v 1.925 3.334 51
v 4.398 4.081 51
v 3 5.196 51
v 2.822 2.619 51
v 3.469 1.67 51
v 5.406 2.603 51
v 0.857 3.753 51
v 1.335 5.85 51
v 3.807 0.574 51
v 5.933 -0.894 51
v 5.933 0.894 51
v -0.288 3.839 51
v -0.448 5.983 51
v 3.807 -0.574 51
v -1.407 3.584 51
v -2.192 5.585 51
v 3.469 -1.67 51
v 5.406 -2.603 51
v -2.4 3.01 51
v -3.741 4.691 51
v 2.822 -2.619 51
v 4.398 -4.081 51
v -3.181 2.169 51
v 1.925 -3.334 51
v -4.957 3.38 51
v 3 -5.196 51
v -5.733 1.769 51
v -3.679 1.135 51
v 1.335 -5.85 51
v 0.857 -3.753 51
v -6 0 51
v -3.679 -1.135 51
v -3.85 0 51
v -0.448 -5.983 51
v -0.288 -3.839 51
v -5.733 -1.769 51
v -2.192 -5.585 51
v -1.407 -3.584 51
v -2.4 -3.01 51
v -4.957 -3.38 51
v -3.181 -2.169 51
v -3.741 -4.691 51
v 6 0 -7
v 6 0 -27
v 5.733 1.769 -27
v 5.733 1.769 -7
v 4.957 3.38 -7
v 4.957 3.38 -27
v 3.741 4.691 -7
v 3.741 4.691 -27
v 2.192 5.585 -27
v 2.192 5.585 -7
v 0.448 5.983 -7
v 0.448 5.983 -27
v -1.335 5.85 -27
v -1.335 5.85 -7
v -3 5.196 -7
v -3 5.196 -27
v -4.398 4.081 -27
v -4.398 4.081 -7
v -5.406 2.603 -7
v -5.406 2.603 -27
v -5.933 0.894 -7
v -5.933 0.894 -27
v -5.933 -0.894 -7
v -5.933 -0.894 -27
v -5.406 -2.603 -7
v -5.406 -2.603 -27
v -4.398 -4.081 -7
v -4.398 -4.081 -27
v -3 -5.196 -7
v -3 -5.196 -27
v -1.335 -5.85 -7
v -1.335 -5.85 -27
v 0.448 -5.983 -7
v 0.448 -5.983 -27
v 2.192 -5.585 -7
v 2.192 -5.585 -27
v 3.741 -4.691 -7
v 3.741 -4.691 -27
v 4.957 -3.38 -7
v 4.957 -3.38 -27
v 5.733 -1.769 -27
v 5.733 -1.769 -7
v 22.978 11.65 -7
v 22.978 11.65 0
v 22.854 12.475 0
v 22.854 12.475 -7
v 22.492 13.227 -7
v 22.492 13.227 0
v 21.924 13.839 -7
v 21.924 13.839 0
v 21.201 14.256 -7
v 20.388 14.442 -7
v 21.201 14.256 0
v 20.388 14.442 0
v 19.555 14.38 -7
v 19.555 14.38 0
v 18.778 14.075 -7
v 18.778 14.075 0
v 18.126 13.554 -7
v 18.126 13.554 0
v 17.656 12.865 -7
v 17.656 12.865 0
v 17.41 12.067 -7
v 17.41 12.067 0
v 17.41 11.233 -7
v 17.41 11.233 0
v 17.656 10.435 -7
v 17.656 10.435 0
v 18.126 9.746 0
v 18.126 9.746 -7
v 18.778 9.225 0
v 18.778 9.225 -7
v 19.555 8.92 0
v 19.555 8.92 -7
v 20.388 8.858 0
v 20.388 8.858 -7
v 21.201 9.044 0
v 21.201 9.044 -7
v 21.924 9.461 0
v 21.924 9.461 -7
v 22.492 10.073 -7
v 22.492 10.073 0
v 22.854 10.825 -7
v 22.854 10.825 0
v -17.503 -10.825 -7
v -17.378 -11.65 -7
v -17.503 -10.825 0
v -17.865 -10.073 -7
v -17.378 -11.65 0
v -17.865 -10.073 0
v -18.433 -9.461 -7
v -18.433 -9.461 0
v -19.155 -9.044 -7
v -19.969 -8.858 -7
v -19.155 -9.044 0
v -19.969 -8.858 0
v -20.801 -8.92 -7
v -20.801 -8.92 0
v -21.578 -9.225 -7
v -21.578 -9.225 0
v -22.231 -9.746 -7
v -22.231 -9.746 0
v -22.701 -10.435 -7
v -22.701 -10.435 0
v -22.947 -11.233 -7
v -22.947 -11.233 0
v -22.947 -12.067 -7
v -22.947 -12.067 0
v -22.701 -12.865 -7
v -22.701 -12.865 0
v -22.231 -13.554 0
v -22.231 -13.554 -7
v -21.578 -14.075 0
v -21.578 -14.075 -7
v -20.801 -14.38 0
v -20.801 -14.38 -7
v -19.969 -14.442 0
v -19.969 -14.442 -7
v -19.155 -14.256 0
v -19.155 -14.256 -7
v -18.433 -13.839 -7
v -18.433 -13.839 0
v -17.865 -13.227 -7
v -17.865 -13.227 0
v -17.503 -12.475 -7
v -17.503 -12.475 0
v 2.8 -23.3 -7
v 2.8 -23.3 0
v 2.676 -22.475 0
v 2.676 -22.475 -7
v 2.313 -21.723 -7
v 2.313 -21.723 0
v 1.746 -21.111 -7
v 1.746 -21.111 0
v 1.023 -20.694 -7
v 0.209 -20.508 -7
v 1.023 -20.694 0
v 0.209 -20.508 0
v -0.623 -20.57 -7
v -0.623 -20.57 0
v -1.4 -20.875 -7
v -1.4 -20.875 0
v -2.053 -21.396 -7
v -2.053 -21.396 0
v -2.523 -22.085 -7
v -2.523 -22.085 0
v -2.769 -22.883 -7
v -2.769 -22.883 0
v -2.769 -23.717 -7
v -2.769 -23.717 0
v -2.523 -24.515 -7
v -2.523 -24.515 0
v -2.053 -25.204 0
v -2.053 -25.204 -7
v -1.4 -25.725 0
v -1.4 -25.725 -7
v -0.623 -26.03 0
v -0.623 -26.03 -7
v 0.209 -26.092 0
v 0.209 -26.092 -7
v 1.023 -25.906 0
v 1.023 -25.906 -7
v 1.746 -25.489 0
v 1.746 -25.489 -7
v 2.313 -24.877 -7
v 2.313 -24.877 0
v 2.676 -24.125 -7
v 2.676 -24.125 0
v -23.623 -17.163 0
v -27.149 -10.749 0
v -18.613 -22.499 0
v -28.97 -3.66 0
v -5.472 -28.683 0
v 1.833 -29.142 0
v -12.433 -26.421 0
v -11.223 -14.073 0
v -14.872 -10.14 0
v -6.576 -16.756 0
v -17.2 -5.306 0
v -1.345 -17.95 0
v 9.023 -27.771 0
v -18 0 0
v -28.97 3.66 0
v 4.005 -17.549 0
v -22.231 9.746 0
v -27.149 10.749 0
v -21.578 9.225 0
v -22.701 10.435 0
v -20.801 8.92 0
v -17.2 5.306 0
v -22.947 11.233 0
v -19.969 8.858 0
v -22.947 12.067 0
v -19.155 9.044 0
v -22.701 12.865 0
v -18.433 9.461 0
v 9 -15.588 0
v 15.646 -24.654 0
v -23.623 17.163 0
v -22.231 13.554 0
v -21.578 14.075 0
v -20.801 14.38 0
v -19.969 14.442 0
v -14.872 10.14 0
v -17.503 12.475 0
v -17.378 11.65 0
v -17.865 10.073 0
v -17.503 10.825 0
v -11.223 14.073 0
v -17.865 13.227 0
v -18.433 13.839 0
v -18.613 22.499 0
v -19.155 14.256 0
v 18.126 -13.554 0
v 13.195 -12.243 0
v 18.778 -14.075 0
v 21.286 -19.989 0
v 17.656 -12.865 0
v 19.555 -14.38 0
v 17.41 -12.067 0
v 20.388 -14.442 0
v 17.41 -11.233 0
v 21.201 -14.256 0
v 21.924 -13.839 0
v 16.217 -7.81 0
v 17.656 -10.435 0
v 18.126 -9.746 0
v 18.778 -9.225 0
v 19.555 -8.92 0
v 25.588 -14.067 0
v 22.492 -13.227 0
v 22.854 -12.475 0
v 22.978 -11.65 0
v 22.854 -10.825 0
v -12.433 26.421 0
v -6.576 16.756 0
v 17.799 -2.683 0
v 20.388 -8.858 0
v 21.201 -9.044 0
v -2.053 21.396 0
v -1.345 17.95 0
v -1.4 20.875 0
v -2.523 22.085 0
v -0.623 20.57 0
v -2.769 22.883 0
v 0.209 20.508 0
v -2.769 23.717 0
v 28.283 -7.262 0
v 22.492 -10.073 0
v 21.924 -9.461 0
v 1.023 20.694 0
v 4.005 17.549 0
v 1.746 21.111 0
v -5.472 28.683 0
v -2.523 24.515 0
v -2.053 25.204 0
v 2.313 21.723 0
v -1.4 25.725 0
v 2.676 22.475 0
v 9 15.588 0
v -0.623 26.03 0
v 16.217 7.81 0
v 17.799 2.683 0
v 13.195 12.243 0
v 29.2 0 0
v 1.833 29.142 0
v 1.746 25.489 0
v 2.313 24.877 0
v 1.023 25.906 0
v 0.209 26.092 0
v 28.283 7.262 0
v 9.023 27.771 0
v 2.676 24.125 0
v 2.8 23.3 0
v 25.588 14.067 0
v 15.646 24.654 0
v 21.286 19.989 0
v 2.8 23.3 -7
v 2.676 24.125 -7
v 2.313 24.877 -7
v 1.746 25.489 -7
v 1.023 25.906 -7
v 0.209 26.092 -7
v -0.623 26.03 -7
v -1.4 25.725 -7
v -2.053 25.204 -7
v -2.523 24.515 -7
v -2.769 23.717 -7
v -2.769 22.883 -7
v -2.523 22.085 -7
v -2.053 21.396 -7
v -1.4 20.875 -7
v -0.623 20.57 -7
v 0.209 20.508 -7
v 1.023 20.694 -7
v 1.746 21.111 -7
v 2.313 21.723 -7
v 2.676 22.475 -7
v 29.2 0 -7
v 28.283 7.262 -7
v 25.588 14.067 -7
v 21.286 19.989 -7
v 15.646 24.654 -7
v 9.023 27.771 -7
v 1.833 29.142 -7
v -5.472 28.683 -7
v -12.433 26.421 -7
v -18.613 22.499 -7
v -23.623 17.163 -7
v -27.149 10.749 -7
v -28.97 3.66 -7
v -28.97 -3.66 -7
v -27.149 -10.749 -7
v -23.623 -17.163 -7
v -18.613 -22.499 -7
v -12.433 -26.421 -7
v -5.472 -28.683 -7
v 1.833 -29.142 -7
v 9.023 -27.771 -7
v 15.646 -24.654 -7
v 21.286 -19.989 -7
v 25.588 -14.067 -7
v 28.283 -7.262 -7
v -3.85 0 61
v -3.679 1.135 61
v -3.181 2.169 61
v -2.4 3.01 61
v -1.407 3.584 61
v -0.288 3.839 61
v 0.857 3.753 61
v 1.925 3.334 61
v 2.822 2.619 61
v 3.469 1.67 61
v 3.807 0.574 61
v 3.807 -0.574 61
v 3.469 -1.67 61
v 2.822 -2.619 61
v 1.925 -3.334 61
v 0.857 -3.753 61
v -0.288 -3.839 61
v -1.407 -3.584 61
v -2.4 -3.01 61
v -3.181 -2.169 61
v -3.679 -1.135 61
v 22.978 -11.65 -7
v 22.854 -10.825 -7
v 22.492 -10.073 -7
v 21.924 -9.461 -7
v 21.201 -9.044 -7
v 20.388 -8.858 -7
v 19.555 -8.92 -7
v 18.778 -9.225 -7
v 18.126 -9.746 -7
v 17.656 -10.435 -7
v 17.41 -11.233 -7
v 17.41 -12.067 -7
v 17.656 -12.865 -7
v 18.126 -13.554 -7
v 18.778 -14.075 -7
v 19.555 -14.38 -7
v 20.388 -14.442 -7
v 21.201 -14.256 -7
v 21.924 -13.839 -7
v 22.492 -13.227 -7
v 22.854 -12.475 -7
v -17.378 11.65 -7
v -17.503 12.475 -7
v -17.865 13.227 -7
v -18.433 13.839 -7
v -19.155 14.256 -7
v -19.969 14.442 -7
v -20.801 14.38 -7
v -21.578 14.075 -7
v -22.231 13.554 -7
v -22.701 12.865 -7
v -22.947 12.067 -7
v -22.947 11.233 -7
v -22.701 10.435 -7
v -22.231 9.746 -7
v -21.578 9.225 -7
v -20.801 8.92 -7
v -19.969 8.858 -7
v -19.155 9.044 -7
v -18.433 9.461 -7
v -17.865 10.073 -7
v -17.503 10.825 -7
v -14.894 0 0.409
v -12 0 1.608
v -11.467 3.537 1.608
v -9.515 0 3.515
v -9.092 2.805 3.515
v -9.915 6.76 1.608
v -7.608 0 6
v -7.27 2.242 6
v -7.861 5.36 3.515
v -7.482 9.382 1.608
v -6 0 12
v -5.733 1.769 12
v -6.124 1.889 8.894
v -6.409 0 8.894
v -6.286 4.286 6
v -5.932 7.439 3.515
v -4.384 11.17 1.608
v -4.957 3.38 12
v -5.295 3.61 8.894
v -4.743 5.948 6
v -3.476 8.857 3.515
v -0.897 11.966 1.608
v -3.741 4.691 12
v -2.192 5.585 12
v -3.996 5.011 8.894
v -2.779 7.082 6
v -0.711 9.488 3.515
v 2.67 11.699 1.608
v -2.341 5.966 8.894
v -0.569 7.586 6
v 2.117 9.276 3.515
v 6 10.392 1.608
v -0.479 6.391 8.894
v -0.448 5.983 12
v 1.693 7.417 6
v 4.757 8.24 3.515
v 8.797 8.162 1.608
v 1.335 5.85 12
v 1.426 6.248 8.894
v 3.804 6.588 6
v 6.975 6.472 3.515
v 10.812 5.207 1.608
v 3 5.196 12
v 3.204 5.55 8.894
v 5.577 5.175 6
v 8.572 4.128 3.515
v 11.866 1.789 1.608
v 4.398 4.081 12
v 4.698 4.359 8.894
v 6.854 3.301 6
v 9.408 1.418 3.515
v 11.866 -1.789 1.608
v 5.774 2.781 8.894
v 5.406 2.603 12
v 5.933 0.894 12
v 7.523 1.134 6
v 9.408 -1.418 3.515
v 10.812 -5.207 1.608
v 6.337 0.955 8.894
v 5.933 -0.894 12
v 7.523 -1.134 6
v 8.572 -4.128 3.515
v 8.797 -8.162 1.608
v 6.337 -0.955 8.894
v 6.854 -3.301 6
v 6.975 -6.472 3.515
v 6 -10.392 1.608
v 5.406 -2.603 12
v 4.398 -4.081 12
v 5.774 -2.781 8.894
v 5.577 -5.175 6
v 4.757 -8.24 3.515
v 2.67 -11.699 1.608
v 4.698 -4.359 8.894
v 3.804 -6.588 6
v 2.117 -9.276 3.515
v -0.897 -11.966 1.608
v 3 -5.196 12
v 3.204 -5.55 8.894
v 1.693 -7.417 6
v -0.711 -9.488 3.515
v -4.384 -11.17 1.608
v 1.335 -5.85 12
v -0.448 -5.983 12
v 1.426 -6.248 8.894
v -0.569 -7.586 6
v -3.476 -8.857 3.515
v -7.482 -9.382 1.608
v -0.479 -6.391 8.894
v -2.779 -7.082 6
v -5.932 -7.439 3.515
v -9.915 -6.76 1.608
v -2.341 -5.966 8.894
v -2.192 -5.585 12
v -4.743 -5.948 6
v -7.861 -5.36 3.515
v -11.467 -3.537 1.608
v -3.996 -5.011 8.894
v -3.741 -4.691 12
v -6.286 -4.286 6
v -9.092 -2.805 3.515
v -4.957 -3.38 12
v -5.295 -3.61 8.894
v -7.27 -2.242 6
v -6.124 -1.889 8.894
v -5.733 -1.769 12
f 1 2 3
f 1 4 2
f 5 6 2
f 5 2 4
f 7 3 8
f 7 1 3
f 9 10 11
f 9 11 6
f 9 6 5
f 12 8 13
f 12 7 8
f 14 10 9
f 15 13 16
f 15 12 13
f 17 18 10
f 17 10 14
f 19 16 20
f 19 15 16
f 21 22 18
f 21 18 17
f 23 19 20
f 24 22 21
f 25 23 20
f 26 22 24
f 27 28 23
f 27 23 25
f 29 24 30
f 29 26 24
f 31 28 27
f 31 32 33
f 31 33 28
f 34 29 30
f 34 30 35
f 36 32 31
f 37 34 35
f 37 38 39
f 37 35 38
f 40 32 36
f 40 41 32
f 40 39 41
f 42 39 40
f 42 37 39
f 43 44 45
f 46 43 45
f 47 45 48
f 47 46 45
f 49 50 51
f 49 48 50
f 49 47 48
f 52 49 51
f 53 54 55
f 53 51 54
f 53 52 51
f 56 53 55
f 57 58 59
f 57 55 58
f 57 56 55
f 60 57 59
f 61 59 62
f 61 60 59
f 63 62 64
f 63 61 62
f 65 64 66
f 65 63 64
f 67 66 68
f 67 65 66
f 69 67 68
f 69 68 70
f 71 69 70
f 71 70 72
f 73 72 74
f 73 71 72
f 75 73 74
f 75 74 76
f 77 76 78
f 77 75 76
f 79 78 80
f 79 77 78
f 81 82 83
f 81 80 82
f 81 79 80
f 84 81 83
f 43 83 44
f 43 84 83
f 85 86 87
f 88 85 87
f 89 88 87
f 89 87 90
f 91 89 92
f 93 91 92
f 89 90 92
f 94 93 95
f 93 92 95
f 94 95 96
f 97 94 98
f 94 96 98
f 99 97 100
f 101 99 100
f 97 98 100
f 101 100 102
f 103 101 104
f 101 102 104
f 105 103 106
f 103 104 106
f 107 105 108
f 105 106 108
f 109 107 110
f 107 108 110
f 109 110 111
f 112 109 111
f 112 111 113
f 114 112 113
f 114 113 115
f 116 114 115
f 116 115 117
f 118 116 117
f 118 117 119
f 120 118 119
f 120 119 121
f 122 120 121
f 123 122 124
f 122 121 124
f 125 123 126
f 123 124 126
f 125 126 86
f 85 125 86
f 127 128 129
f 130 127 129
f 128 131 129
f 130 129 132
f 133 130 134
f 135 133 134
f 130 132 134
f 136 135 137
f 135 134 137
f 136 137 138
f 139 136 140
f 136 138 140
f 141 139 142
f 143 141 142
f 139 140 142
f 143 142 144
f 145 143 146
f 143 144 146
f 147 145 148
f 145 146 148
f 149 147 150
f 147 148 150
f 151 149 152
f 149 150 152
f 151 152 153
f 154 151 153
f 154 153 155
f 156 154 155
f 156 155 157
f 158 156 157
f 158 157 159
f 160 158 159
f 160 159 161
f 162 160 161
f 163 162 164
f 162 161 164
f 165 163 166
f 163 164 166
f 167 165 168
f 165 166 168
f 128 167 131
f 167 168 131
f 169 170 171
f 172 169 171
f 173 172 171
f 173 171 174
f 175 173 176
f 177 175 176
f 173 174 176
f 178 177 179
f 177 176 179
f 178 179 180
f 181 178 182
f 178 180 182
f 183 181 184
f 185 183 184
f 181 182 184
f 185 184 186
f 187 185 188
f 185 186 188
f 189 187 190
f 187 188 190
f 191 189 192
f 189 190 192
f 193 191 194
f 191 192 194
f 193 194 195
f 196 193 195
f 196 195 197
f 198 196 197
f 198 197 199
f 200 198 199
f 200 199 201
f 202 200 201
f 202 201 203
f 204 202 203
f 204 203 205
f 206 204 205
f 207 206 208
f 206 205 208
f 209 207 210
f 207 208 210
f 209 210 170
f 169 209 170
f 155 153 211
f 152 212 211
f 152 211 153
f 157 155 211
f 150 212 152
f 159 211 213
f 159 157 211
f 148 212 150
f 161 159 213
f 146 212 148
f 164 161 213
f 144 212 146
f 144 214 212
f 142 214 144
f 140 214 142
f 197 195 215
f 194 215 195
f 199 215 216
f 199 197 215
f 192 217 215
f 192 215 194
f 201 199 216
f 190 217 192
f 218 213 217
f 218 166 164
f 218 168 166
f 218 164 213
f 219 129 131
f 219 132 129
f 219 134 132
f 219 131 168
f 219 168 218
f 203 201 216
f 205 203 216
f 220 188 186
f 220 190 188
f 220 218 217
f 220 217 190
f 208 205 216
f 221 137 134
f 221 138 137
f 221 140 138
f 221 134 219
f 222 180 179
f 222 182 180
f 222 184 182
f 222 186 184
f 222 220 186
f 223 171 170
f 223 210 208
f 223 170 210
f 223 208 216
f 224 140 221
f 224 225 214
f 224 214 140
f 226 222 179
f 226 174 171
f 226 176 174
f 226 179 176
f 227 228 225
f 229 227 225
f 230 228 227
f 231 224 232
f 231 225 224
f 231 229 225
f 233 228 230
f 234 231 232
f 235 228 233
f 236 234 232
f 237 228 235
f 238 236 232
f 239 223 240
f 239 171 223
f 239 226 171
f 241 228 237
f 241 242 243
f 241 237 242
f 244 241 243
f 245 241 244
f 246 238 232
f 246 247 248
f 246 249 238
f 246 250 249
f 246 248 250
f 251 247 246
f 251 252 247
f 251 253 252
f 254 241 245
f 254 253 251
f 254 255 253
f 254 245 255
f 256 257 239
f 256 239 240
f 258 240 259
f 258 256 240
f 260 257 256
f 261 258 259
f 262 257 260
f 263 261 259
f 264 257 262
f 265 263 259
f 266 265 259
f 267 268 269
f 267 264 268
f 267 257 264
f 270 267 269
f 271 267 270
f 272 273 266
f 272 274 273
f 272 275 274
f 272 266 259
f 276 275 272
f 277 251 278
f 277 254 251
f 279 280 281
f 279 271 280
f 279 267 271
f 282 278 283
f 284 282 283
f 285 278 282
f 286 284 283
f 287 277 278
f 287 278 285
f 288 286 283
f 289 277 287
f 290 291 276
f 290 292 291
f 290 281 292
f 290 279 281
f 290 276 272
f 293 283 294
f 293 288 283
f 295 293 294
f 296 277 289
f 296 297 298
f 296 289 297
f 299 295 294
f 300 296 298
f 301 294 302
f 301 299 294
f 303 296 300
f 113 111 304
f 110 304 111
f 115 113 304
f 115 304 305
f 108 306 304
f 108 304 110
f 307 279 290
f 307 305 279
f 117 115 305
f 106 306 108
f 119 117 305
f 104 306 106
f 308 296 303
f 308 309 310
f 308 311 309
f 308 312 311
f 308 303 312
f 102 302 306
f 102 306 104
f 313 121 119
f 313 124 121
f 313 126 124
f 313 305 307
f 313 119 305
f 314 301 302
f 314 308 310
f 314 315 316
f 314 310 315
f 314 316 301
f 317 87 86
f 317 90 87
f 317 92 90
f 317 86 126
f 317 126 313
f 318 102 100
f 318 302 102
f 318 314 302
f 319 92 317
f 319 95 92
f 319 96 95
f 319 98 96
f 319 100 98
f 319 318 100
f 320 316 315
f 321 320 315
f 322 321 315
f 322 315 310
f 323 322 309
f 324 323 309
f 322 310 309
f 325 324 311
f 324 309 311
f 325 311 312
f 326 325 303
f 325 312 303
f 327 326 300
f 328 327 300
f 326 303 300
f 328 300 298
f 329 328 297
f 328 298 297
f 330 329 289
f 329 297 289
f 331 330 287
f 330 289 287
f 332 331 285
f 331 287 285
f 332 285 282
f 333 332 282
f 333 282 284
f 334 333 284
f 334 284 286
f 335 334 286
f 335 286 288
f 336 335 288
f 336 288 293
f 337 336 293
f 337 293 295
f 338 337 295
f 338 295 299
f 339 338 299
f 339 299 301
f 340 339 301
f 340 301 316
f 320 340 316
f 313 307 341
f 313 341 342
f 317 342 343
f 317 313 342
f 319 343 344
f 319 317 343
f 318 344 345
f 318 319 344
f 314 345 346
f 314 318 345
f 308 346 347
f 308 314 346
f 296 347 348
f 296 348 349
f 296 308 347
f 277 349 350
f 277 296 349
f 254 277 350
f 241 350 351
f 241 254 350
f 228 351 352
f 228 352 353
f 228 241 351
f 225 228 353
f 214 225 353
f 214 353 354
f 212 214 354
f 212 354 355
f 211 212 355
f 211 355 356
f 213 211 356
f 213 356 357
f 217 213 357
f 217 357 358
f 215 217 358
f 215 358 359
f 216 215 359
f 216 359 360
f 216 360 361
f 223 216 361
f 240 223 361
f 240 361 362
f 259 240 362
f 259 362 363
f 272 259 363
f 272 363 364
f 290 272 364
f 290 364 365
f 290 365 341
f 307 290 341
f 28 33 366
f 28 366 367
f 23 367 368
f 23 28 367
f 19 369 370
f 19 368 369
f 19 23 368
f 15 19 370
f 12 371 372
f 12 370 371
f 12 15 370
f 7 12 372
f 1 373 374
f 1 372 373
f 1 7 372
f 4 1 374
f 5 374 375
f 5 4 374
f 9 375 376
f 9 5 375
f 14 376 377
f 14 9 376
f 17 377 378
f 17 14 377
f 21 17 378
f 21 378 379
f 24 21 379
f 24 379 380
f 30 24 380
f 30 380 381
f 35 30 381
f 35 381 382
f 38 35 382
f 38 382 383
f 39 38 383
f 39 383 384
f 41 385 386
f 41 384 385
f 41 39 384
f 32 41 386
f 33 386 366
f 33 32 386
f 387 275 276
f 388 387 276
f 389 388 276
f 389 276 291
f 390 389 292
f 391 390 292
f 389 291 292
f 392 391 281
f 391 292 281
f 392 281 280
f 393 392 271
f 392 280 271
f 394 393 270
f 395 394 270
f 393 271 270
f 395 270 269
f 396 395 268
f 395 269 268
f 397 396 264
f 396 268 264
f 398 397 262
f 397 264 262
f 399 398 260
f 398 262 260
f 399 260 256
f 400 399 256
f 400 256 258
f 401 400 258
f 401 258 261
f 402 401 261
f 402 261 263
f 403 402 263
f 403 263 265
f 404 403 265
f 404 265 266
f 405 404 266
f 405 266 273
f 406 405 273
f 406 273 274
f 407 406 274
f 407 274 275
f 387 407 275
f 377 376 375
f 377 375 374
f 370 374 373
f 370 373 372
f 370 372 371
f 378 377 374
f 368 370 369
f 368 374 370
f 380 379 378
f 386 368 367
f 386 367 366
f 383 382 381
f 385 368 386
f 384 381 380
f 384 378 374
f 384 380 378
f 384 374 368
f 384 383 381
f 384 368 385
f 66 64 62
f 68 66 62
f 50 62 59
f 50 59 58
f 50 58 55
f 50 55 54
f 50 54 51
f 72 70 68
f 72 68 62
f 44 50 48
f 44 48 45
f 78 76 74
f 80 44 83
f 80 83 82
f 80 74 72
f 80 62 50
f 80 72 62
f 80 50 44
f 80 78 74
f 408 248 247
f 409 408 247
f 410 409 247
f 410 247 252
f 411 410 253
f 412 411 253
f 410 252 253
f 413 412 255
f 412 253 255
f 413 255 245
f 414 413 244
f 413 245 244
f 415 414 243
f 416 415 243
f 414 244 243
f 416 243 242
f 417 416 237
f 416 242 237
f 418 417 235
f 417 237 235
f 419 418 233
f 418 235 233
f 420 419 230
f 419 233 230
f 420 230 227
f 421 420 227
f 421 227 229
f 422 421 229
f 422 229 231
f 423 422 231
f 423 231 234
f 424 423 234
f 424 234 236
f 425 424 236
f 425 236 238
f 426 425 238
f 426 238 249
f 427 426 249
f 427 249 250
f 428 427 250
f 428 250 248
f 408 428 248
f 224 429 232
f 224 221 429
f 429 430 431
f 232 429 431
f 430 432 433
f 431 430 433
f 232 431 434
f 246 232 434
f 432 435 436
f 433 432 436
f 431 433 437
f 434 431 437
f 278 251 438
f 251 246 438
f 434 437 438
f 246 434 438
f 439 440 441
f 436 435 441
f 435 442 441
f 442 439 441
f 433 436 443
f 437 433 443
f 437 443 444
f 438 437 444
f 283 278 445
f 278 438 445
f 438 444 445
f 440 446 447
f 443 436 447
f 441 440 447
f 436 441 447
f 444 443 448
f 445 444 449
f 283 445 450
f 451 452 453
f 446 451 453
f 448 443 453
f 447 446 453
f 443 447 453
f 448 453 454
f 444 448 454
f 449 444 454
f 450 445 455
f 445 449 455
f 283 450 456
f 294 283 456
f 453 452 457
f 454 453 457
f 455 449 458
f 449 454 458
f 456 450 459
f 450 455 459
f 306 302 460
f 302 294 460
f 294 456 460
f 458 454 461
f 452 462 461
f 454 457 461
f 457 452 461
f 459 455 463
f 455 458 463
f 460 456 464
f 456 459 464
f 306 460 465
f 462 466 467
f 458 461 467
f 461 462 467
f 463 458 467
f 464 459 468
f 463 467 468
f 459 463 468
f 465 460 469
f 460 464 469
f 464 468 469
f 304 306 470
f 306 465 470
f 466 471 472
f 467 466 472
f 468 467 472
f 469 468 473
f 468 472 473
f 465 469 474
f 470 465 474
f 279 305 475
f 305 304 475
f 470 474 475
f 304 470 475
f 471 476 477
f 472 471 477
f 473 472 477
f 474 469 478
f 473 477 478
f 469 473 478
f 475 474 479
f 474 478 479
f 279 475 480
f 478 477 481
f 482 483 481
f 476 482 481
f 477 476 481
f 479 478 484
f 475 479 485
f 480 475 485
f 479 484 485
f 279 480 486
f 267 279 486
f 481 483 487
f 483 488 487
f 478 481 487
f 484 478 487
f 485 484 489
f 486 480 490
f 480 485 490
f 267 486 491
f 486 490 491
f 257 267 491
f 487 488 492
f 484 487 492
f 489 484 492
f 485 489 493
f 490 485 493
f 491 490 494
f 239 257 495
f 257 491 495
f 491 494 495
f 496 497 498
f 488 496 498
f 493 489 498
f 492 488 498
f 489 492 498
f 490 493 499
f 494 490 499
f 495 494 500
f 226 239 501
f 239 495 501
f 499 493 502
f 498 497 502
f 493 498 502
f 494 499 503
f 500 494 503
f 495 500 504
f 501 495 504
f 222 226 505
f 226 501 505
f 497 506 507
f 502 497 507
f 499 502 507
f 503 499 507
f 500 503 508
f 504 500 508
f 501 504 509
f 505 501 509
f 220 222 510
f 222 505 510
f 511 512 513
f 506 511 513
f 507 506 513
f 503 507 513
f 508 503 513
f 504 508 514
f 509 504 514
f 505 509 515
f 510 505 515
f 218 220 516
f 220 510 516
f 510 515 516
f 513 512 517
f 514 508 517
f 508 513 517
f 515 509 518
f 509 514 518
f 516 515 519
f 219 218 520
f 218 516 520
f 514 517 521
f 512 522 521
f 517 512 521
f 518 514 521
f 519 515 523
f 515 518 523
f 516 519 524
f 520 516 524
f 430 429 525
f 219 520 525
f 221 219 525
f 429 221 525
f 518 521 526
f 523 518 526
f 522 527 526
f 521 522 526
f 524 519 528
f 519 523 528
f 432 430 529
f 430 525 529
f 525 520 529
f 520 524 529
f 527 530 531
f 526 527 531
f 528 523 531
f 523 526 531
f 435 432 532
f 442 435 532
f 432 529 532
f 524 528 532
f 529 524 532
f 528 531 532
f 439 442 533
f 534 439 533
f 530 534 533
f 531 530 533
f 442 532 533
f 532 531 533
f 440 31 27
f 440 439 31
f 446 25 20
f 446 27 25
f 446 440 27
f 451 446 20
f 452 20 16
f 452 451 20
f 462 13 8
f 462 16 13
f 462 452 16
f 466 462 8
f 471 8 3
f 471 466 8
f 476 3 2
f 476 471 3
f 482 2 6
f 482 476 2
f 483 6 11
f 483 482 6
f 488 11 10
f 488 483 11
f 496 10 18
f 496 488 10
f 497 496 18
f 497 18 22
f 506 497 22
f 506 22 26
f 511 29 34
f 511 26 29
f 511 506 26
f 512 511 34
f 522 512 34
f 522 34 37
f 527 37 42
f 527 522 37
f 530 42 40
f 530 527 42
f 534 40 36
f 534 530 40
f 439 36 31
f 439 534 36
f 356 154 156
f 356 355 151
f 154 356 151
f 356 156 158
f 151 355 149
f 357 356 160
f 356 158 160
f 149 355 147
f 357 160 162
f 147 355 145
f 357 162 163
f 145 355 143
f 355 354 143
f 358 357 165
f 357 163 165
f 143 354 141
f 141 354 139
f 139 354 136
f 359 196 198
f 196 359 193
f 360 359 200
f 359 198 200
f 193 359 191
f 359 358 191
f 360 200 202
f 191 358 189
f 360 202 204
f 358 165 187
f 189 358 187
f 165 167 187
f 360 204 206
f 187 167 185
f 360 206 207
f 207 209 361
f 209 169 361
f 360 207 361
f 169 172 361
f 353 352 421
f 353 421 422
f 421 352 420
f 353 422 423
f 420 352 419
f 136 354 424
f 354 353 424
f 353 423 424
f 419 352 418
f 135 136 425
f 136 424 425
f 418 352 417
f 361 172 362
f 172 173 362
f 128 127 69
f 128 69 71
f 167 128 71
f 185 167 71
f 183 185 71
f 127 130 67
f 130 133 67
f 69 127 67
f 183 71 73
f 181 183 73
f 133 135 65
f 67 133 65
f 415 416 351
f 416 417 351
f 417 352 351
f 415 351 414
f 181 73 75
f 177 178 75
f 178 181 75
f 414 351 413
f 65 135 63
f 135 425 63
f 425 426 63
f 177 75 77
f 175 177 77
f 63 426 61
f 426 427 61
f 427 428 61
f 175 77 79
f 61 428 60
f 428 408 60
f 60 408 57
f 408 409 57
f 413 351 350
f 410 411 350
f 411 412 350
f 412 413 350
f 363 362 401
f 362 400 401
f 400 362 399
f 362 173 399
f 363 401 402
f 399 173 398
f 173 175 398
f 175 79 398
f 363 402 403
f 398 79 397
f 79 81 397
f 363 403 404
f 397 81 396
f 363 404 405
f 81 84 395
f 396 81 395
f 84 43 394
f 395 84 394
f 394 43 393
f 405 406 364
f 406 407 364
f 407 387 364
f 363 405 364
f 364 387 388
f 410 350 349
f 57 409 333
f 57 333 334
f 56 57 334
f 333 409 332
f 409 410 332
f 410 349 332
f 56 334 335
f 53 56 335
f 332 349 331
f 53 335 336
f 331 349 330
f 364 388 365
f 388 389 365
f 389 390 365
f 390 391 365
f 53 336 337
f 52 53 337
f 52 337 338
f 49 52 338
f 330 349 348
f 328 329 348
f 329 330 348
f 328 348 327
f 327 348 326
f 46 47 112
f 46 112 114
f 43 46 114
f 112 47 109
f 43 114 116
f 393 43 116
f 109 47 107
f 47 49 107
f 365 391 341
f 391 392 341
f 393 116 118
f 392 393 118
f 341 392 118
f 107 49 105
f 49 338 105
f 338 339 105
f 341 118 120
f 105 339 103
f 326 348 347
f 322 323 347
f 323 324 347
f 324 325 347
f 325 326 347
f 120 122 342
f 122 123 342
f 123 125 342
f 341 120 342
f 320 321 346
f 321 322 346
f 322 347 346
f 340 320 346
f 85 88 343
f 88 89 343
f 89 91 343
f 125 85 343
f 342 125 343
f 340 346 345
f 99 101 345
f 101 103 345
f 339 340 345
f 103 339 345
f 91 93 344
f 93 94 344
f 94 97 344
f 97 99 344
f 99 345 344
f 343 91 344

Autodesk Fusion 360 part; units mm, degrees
sketch "Boceto1" plane through (0, 0, 0) normal (0, 0, 1) x (1, 0, 0)
  circle A0 centre (0, 0) radius 29.2
  circle A1 centre (0, 23.3) radius 2.8
  circle A2 centre (-20.1784, 11.65) radius 2.8
  circle A3 centre (-20.1784, -11.65) radius 2.8
  circle A4 centre (0, -23.3) radius 2.8
  circle A5 centre (20.1784, -11.65) radius 2.8
  circle A6 centre (20.1784, 11.65) radius 2.8
  dimension "d1" = 58.4
  dimension "d2" = 5.6
  dimension "d4" = 360
  dimension "d14" = 23.3
extrude "Extruir1" add sketch "Boceto1" against normal blind 7
sketch "Boceto2" plane through (0, 0, 0) normal (0, 0, 1) x (-1, 0, 0)
  circle A0 centre (0, -23.3) radius 2.8
  circle A1 centre (20.1784, 11.65) radius 2.8
  circle A2 centre (20.1784, -11.65) radius 2.8
  circle A3 centre (0, 23.3) radius 2.8
  circle A4 centre (-20.1784, 11.65) radius 2.8
  circle A5 centre (-20.1784, -11.65) radius 2.8
  circle A6 centre (0, 0) radius 29.2
  circle A7 centre (0, 0) radius 6
  dimension "d7" = 12
extrude "Extruir2" add sketch "Boceto2" along normal blind 51 contours A7
sketch "Boceto3" plane through (0, 0, 51) normal (0, 0, 1) x (-1, 0, 0)
  circle A0 centre (0, 0) radius 6
  circle A1 centre (0, 0) radius 3.85
  dimension "d10" = 7.7
extrude "Extruir3" add sketch "Boceto3" along normal blind 10 contours A1
sketch "Boceto4" plane through (0, 0, 0) normal (0, 0, 1) x (-1, 0, 0)
  circle A0 centre (0, 0) radius 6
  circle A1 centre (0, -23.3) radius 2.8
  circle A2 centre (20.1784, 11.65) radius 2.8
  circle A3 centre (20.1784, -11.65) radius 2.8
  circle A4 centre (0, 23.3) radius 2.8
  circle A5 centre (-20.1784, 11.65) radius 2.8
  circle A6 centre (-20.1784, -11.65) radius 2.8
  circle A7 centre (0, 0) radius 29.2
  circle A8 centre (0, 0) radius 20.3
  dimension "d13" = 40.6
sketch "Boceto5" plane through (0, 0, 0) normal (0, 1, 0) x (1, 0, 0)
fillet "Empalme1" radius 12 1 edges at (5.594, -2.1697, 0)
sketch "Boceto6" plane through (0, 0, -7) normal (0, 0, -1) x (1, 0, 0)
  circle A0 centre (0, -23.3) radius 2.8
  circle A1 centre (-20.1784, -11.65) radius 2.8
  circle A2 centre (-20.1784, 11.65) radius 2.8
  circle A3 centre (0, 23.3) radius 2.8
  circle A4 centre (20.1784, 11.65) radius 2.8
  circle A5 centre (20.1784, -11.65) radius 2.8
  circle A6 centre (0, 0) radius 29.2
  circle A7 centre (0, 0) radius 6
  dimension "d17" = 12
extrude "Extruir4" add sketch "Boceto6" along normal blind 20 contours A7
